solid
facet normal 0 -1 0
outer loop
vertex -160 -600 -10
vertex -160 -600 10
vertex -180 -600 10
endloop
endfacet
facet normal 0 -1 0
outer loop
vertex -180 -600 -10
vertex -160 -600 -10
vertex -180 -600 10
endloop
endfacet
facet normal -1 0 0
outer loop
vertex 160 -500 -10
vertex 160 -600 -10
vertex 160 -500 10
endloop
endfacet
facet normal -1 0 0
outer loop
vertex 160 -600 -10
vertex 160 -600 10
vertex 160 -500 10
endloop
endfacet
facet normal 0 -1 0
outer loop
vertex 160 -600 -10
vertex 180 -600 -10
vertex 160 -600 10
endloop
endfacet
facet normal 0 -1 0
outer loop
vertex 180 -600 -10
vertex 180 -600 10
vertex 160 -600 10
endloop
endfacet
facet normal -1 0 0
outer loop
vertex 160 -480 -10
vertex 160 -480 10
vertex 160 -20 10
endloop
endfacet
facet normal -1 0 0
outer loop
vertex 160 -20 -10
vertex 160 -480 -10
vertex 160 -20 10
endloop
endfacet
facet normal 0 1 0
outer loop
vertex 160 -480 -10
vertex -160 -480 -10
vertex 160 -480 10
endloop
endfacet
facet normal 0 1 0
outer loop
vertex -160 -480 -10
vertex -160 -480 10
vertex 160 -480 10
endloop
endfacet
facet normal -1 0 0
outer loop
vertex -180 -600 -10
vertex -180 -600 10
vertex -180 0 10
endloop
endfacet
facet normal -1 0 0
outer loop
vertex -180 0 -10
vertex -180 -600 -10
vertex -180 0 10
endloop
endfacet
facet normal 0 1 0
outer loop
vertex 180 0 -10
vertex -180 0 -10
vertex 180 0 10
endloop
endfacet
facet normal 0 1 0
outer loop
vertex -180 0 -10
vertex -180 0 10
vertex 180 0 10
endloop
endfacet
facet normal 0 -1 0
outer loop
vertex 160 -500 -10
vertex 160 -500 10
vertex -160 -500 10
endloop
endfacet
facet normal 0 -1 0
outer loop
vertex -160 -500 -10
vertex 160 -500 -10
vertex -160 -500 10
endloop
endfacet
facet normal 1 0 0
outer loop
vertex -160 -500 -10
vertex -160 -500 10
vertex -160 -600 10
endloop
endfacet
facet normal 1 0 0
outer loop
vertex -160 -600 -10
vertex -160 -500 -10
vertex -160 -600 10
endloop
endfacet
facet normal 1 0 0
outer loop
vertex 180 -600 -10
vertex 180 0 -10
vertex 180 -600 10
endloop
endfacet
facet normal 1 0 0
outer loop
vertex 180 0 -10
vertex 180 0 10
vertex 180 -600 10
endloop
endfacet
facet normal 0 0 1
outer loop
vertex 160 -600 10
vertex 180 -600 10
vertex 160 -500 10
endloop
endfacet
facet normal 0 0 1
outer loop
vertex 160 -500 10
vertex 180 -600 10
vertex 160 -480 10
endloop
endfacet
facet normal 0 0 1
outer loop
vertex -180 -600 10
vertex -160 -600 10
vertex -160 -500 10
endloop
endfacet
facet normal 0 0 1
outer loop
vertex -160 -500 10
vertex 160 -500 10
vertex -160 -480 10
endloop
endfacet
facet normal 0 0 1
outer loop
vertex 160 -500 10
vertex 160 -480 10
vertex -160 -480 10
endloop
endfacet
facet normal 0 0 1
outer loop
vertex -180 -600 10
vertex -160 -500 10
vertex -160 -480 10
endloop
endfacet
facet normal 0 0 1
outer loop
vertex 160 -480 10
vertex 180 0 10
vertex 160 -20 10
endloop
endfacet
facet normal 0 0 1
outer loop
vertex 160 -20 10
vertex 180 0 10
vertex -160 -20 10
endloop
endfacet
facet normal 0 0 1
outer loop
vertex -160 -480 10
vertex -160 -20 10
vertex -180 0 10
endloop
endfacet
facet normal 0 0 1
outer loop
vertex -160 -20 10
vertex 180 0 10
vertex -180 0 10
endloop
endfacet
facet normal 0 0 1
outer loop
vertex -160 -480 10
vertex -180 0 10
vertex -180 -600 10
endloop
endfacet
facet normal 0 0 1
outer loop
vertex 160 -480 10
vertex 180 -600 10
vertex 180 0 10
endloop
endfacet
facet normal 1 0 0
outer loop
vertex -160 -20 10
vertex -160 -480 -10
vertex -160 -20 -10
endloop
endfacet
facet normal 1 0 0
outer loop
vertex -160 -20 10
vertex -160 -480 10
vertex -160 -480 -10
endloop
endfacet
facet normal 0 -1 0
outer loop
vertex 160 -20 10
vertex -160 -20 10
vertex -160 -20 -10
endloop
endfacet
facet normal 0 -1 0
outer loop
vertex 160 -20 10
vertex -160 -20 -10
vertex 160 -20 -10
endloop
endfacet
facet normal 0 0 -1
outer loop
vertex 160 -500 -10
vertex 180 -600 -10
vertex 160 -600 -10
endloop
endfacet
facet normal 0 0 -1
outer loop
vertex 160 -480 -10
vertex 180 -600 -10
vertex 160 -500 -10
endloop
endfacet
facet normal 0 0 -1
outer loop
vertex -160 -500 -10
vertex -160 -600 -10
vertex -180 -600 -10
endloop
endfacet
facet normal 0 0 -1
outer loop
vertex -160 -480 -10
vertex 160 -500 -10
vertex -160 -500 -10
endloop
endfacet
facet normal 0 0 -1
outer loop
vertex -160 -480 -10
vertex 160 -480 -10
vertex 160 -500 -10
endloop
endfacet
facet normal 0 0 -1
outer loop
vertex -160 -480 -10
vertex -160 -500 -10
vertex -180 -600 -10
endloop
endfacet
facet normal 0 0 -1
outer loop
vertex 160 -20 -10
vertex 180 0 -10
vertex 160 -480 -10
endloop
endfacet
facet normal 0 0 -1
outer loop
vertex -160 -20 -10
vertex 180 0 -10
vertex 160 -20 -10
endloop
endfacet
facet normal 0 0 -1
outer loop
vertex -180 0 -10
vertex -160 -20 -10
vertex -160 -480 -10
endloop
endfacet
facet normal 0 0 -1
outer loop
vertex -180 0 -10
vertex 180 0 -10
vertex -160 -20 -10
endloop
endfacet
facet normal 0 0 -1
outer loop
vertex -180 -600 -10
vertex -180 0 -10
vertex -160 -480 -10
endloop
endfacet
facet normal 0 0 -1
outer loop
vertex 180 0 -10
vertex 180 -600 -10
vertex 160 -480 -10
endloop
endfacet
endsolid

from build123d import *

# Parameters (mm, degrees)
SKETCH1_W           = 320
SKETCH1_H           = 460
BOSS_EXTRUDE1_DEPTH = 10


with BuildPart() as part:
    # Sketch1 → Boss-Extrude1 (new, symmetric)
    with BuildSketch(Plane.XY):
        Polygon((-180, -600), (-180, 0), (180, 0), (180, -600), (160, -600), (160, -500), (-160, -500), (-160, -600), align=None)
        with Locations((0, -250)):
            Rectangle(SKETCH1_W, SKETCH1_H, mode=Mode.SUBTRACT)
    extrude(amount=BOSS_EXTRUDE1_DEPTH, both=True)


solid = part.part
